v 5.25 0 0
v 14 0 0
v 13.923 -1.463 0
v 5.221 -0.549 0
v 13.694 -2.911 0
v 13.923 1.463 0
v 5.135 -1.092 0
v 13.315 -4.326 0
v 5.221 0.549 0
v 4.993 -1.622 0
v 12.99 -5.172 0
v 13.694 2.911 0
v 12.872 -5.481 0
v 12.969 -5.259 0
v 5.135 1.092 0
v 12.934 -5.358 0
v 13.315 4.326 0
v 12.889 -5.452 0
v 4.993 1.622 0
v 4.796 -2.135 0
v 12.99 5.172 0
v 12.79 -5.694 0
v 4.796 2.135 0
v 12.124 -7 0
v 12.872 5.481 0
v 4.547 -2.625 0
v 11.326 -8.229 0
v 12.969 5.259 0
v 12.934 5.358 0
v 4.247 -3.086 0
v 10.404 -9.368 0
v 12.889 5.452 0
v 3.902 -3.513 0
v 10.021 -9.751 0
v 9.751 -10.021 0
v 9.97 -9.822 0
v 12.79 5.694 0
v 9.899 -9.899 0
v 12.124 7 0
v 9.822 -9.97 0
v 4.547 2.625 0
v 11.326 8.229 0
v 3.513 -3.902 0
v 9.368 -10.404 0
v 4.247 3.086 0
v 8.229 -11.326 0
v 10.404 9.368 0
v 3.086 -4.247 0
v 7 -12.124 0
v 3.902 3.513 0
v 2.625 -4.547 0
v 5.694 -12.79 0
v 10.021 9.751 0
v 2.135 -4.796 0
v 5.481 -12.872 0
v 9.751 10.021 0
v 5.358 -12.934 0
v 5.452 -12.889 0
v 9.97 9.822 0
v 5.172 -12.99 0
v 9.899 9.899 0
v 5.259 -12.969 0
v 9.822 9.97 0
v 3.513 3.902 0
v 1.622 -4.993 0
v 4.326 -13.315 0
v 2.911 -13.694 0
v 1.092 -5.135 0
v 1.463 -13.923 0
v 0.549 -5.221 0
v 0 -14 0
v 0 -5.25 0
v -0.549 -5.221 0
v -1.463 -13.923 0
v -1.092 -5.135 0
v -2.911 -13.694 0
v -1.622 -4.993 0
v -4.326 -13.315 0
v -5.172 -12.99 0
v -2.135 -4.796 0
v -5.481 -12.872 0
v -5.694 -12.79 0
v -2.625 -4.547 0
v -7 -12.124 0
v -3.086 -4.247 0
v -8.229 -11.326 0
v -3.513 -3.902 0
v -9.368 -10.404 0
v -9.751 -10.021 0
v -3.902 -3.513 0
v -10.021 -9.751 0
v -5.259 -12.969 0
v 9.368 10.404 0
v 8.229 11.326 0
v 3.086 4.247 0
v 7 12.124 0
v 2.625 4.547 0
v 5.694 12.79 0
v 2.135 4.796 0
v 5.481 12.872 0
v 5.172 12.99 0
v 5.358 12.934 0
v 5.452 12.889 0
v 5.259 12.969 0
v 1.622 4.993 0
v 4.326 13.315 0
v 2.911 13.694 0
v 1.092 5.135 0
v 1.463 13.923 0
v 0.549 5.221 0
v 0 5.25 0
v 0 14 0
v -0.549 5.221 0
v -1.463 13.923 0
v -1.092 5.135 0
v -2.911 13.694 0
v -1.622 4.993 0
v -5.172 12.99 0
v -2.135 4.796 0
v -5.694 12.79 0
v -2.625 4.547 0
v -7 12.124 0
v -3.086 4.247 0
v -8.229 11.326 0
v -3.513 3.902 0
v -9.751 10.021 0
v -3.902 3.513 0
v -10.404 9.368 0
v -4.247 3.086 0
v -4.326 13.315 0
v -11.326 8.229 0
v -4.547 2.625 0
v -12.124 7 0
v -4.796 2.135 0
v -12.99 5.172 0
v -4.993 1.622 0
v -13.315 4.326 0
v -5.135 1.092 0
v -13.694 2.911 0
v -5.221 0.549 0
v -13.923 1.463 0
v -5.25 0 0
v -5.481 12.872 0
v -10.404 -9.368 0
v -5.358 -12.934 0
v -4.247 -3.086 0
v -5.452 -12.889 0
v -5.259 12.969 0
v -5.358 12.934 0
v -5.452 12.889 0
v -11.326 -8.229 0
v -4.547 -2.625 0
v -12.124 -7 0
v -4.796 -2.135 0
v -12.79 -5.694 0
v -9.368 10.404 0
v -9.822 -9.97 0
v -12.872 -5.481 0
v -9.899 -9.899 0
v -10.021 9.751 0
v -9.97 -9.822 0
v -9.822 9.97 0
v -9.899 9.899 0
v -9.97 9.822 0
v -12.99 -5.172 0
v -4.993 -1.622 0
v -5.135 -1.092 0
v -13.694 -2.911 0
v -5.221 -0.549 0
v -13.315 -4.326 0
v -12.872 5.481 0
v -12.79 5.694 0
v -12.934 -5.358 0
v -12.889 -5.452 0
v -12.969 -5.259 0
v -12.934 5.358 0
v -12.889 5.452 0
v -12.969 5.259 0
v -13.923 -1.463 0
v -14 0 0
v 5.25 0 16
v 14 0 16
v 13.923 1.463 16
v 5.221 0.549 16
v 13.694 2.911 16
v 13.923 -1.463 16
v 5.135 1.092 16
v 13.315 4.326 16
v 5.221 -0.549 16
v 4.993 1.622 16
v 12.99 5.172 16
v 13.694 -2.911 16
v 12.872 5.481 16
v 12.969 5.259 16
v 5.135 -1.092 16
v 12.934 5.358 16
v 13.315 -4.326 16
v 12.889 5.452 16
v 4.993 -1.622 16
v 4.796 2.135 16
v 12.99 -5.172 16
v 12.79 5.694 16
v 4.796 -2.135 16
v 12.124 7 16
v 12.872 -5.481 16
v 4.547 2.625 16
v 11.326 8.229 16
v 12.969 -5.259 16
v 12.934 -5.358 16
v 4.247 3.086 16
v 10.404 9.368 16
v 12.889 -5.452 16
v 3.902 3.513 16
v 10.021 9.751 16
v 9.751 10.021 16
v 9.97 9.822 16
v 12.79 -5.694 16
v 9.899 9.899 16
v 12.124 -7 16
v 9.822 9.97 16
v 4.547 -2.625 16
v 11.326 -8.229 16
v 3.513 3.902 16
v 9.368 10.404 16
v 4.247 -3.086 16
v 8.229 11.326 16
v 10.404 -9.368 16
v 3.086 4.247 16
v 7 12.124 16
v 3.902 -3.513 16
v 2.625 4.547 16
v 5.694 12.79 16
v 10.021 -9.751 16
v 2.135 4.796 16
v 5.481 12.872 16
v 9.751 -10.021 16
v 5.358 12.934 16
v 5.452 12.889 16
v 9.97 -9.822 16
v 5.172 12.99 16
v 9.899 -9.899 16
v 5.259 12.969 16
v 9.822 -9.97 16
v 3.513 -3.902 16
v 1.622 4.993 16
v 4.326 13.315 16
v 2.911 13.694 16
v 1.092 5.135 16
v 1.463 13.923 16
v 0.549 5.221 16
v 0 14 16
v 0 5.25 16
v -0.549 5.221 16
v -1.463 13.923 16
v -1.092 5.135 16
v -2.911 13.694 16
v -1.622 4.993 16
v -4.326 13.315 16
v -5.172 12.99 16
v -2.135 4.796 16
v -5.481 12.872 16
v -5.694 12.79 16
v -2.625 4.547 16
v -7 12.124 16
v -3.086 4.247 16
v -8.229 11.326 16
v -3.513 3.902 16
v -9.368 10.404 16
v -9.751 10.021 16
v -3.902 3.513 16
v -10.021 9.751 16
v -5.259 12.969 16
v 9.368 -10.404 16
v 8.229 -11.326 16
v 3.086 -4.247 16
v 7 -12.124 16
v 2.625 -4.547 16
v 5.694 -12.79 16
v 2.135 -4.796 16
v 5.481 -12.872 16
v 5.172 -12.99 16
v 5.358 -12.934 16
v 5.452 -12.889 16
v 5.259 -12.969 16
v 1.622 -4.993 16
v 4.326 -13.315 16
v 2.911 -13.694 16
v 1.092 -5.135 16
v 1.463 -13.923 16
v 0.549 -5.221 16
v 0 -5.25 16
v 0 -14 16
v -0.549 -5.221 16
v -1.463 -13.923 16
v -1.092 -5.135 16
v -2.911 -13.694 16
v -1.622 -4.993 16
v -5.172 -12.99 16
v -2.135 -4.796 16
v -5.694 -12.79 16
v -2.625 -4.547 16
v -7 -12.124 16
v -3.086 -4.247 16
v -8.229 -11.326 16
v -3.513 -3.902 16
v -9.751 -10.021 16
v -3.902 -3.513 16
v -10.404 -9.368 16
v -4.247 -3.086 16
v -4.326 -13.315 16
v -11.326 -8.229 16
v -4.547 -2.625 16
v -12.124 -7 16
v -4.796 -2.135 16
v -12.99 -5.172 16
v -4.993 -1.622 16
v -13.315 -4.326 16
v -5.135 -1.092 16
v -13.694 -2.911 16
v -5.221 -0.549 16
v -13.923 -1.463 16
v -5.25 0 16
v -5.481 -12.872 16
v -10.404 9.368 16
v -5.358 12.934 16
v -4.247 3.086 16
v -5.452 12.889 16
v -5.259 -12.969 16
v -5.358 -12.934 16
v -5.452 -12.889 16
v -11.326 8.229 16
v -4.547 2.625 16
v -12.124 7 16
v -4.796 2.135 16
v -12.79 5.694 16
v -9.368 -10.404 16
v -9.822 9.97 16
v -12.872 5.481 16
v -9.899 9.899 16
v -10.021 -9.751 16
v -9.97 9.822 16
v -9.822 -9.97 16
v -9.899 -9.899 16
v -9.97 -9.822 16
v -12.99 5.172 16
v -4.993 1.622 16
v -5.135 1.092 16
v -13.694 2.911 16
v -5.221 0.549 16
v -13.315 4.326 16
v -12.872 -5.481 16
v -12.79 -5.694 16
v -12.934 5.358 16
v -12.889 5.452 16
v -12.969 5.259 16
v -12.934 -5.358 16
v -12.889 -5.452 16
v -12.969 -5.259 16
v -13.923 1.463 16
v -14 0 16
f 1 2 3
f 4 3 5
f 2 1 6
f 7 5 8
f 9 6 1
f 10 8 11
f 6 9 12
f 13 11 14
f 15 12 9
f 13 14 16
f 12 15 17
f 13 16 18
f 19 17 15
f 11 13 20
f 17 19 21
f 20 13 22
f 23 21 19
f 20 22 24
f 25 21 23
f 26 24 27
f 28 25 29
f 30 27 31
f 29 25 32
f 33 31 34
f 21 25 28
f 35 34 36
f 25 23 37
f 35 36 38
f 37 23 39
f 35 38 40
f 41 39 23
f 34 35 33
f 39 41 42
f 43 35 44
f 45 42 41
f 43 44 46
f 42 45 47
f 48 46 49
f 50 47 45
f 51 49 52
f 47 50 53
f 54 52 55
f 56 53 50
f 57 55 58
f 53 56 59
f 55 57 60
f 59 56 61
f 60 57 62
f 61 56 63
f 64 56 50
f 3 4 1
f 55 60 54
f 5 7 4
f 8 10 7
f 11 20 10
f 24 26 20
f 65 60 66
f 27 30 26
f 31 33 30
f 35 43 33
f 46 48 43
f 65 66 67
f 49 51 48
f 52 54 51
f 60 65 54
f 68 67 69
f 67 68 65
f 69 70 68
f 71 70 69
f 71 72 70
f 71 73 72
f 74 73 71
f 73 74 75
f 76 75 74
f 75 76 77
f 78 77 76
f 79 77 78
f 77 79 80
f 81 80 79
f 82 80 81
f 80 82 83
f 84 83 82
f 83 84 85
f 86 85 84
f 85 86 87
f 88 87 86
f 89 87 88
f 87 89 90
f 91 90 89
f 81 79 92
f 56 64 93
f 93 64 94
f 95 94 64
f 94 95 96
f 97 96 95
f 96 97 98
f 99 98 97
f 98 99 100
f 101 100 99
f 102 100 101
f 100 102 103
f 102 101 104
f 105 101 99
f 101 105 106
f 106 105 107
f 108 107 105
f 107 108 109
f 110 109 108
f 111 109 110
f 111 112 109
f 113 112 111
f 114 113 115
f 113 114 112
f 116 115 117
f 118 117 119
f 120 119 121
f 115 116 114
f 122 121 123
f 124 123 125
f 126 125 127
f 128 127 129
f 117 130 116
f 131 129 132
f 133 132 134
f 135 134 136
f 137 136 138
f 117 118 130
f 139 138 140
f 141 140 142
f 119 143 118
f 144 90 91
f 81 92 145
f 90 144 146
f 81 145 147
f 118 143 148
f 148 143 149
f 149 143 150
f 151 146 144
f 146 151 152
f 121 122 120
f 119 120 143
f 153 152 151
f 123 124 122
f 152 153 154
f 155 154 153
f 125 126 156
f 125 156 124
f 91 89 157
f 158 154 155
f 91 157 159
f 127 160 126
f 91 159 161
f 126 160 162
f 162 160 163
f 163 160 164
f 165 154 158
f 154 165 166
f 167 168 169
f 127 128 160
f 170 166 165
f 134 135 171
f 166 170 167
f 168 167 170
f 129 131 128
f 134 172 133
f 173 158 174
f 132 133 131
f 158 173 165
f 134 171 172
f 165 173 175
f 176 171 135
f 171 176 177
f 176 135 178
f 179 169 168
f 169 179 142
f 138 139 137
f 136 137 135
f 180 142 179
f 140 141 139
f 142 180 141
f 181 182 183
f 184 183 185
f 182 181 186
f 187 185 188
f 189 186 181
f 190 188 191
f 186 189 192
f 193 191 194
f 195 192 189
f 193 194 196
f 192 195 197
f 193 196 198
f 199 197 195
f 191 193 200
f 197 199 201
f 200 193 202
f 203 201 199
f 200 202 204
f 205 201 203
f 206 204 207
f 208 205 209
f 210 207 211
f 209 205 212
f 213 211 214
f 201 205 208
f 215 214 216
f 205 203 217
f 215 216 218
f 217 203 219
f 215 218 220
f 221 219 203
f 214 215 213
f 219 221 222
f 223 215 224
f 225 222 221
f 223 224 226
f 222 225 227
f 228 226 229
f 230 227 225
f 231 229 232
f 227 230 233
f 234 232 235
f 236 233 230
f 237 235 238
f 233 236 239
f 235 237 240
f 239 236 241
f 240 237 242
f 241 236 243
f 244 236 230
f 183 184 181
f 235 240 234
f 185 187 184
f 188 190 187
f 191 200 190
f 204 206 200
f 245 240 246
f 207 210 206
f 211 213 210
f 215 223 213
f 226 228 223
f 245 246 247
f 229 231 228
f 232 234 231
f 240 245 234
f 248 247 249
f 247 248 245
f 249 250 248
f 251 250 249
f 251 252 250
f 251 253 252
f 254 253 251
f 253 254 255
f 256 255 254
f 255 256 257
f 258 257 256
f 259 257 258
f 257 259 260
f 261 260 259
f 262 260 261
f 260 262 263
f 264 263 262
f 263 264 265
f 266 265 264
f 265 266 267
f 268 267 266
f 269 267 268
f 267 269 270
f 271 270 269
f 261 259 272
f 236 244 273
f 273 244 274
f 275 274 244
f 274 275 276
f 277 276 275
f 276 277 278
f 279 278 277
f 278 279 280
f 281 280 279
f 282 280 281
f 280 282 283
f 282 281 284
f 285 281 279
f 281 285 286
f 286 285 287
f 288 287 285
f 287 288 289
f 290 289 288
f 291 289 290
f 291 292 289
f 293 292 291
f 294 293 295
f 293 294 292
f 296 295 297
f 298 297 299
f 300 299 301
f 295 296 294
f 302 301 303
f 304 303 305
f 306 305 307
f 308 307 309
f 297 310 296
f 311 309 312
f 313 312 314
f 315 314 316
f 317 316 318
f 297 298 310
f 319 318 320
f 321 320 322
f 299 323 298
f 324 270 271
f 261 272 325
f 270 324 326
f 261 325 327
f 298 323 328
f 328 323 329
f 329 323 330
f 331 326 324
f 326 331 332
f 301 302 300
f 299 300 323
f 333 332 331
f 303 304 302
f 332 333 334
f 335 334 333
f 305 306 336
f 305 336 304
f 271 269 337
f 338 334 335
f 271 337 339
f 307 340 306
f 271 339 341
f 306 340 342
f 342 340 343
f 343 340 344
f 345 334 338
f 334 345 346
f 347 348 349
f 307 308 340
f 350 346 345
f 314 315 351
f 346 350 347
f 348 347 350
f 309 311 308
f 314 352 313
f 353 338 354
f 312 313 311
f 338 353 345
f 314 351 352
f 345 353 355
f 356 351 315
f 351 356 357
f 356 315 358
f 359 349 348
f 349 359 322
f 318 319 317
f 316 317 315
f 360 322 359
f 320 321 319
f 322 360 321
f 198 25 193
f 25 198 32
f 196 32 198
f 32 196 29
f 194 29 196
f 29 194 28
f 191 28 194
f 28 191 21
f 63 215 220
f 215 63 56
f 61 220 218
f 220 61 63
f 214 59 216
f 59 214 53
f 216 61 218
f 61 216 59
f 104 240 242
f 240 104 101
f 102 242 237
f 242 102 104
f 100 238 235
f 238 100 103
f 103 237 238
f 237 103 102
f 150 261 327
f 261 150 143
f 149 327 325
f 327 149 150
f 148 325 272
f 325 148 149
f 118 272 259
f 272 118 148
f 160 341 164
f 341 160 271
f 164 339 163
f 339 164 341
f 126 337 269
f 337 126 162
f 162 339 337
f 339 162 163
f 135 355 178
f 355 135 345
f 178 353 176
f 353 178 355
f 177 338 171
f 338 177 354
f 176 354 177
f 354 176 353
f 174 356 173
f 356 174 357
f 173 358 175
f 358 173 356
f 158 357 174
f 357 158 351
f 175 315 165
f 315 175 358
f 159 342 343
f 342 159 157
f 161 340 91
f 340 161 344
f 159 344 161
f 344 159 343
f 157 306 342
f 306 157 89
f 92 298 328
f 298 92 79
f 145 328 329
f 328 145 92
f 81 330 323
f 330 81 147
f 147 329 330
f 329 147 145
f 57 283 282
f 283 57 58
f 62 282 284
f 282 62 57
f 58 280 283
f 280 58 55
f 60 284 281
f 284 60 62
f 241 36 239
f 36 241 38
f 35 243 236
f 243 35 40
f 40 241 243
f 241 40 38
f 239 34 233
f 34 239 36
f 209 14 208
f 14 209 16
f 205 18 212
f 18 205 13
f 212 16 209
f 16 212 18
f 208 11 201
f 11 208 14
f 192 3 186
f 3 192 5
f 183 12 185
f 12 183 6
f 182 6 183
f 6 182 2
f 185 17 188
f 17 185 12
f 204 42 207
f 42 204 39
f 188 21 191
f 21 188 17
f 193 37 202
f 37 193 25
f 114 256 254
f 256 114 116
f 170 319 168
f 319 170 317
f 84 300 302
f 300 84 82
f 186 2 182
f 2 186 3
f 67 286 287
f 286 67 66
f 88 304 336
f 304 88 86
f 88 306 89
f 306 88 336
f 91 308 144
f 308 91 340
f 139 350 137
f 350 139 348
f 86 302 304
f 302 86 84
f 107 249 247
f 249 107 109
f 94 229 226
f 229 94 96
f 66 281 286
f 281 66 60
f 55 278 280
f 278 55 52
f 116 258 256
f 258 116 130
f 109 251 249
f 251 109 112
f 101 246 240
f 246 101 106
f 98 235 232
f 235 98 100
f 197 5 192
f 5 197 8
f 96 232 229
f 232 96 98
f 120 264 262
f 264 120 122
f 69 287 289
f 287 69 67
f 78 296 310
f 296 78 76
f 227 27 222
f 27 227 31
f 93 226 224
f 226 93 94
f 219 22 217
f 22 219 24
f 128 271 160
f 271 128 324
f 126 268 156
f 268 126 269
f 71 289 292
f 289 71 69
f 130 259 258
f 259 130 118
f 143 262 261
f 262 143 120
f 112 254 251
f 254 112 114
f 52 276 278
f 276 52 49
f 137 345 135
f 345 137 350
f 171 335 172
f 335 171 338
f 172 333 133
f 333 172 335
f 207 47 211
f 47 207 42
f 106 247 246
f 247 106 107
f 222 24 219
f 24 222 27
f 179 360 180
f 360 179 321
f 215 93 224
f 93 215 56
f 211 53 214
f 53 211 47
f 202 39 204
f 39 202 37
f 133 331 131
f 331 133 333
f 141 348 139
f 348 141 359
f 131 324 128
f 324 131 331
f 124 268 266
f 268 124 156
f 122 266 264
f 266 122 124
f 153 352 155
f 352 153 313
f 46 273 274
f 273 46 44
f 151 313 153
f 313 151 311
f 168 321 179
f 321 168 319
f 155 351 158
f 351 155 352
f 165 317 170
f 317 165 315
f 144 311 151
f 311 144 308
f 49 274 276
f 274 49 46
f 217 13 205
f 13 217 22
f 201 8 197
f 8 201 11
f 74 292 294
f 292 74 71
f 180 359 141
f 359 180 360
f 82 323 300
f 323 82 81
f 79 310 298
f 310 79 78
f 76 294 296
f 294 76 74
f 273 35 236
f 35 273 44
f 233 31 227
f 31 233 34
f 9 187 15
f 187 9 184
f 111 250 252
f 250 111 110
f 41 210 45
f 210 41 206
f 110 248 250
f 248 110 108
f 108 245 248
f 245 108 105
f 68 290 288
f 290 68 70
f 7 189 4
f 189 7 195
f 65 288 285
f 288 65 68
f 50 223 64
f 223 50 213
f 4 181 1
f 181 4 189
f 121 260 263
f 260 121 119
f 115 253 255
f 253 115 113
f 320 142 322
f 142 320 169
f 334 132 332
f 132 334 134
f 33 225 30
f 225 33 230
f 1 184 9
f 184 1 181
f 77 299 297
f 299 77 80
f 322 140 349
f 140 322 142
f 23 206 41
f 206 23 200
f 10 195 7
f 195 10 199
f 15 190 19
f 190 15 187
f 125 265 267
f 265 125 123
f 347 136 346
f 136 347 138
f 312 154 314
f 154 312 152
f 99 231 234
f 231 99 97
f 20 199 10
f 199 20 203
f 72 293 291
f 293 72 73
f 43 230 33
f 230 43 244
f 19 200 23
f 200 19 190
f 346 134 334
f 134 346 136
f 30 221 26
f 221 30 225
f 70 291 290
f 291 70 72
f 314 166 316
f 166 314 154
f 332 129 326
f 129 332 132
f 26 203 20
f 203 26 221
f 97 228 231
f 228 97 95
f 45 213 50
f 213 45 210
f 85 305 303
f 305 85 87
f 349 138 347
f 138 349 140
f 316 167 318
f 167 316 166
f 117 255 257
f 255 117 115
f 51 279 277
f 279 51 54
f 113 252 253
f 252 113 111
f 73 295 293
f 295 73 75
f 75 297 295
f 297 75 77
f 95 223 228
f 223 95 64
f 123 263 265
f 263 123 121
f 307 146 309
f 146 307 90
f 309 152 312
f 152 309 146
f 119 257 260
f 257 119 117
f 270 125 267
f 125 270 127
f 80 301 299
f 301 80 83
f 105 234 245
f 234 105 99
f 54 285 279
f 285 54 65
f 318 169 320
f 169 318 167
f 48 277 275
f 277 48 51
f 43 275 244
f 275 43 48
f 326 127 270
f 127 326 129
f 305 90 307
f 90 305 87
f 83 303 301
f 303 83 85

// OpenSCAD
// Threaded hand knob.
$fn = 60;
eps = 0.02;
thread_d = 10.5;
knob_d = 28;
knob_h = 16;
difference() {
    union() {
        cylinder(d=knob_d,h=knob_h);
        for(i=[0:15]) rotate([0,0,i*22.5]) translate([knob_d/2-1,0,0]) cylinder(d=2,h=knob_h);
    }
    translate([0,0,-eps]) cylinder(d=thread_d,h=knob_h+2*eps);
}
